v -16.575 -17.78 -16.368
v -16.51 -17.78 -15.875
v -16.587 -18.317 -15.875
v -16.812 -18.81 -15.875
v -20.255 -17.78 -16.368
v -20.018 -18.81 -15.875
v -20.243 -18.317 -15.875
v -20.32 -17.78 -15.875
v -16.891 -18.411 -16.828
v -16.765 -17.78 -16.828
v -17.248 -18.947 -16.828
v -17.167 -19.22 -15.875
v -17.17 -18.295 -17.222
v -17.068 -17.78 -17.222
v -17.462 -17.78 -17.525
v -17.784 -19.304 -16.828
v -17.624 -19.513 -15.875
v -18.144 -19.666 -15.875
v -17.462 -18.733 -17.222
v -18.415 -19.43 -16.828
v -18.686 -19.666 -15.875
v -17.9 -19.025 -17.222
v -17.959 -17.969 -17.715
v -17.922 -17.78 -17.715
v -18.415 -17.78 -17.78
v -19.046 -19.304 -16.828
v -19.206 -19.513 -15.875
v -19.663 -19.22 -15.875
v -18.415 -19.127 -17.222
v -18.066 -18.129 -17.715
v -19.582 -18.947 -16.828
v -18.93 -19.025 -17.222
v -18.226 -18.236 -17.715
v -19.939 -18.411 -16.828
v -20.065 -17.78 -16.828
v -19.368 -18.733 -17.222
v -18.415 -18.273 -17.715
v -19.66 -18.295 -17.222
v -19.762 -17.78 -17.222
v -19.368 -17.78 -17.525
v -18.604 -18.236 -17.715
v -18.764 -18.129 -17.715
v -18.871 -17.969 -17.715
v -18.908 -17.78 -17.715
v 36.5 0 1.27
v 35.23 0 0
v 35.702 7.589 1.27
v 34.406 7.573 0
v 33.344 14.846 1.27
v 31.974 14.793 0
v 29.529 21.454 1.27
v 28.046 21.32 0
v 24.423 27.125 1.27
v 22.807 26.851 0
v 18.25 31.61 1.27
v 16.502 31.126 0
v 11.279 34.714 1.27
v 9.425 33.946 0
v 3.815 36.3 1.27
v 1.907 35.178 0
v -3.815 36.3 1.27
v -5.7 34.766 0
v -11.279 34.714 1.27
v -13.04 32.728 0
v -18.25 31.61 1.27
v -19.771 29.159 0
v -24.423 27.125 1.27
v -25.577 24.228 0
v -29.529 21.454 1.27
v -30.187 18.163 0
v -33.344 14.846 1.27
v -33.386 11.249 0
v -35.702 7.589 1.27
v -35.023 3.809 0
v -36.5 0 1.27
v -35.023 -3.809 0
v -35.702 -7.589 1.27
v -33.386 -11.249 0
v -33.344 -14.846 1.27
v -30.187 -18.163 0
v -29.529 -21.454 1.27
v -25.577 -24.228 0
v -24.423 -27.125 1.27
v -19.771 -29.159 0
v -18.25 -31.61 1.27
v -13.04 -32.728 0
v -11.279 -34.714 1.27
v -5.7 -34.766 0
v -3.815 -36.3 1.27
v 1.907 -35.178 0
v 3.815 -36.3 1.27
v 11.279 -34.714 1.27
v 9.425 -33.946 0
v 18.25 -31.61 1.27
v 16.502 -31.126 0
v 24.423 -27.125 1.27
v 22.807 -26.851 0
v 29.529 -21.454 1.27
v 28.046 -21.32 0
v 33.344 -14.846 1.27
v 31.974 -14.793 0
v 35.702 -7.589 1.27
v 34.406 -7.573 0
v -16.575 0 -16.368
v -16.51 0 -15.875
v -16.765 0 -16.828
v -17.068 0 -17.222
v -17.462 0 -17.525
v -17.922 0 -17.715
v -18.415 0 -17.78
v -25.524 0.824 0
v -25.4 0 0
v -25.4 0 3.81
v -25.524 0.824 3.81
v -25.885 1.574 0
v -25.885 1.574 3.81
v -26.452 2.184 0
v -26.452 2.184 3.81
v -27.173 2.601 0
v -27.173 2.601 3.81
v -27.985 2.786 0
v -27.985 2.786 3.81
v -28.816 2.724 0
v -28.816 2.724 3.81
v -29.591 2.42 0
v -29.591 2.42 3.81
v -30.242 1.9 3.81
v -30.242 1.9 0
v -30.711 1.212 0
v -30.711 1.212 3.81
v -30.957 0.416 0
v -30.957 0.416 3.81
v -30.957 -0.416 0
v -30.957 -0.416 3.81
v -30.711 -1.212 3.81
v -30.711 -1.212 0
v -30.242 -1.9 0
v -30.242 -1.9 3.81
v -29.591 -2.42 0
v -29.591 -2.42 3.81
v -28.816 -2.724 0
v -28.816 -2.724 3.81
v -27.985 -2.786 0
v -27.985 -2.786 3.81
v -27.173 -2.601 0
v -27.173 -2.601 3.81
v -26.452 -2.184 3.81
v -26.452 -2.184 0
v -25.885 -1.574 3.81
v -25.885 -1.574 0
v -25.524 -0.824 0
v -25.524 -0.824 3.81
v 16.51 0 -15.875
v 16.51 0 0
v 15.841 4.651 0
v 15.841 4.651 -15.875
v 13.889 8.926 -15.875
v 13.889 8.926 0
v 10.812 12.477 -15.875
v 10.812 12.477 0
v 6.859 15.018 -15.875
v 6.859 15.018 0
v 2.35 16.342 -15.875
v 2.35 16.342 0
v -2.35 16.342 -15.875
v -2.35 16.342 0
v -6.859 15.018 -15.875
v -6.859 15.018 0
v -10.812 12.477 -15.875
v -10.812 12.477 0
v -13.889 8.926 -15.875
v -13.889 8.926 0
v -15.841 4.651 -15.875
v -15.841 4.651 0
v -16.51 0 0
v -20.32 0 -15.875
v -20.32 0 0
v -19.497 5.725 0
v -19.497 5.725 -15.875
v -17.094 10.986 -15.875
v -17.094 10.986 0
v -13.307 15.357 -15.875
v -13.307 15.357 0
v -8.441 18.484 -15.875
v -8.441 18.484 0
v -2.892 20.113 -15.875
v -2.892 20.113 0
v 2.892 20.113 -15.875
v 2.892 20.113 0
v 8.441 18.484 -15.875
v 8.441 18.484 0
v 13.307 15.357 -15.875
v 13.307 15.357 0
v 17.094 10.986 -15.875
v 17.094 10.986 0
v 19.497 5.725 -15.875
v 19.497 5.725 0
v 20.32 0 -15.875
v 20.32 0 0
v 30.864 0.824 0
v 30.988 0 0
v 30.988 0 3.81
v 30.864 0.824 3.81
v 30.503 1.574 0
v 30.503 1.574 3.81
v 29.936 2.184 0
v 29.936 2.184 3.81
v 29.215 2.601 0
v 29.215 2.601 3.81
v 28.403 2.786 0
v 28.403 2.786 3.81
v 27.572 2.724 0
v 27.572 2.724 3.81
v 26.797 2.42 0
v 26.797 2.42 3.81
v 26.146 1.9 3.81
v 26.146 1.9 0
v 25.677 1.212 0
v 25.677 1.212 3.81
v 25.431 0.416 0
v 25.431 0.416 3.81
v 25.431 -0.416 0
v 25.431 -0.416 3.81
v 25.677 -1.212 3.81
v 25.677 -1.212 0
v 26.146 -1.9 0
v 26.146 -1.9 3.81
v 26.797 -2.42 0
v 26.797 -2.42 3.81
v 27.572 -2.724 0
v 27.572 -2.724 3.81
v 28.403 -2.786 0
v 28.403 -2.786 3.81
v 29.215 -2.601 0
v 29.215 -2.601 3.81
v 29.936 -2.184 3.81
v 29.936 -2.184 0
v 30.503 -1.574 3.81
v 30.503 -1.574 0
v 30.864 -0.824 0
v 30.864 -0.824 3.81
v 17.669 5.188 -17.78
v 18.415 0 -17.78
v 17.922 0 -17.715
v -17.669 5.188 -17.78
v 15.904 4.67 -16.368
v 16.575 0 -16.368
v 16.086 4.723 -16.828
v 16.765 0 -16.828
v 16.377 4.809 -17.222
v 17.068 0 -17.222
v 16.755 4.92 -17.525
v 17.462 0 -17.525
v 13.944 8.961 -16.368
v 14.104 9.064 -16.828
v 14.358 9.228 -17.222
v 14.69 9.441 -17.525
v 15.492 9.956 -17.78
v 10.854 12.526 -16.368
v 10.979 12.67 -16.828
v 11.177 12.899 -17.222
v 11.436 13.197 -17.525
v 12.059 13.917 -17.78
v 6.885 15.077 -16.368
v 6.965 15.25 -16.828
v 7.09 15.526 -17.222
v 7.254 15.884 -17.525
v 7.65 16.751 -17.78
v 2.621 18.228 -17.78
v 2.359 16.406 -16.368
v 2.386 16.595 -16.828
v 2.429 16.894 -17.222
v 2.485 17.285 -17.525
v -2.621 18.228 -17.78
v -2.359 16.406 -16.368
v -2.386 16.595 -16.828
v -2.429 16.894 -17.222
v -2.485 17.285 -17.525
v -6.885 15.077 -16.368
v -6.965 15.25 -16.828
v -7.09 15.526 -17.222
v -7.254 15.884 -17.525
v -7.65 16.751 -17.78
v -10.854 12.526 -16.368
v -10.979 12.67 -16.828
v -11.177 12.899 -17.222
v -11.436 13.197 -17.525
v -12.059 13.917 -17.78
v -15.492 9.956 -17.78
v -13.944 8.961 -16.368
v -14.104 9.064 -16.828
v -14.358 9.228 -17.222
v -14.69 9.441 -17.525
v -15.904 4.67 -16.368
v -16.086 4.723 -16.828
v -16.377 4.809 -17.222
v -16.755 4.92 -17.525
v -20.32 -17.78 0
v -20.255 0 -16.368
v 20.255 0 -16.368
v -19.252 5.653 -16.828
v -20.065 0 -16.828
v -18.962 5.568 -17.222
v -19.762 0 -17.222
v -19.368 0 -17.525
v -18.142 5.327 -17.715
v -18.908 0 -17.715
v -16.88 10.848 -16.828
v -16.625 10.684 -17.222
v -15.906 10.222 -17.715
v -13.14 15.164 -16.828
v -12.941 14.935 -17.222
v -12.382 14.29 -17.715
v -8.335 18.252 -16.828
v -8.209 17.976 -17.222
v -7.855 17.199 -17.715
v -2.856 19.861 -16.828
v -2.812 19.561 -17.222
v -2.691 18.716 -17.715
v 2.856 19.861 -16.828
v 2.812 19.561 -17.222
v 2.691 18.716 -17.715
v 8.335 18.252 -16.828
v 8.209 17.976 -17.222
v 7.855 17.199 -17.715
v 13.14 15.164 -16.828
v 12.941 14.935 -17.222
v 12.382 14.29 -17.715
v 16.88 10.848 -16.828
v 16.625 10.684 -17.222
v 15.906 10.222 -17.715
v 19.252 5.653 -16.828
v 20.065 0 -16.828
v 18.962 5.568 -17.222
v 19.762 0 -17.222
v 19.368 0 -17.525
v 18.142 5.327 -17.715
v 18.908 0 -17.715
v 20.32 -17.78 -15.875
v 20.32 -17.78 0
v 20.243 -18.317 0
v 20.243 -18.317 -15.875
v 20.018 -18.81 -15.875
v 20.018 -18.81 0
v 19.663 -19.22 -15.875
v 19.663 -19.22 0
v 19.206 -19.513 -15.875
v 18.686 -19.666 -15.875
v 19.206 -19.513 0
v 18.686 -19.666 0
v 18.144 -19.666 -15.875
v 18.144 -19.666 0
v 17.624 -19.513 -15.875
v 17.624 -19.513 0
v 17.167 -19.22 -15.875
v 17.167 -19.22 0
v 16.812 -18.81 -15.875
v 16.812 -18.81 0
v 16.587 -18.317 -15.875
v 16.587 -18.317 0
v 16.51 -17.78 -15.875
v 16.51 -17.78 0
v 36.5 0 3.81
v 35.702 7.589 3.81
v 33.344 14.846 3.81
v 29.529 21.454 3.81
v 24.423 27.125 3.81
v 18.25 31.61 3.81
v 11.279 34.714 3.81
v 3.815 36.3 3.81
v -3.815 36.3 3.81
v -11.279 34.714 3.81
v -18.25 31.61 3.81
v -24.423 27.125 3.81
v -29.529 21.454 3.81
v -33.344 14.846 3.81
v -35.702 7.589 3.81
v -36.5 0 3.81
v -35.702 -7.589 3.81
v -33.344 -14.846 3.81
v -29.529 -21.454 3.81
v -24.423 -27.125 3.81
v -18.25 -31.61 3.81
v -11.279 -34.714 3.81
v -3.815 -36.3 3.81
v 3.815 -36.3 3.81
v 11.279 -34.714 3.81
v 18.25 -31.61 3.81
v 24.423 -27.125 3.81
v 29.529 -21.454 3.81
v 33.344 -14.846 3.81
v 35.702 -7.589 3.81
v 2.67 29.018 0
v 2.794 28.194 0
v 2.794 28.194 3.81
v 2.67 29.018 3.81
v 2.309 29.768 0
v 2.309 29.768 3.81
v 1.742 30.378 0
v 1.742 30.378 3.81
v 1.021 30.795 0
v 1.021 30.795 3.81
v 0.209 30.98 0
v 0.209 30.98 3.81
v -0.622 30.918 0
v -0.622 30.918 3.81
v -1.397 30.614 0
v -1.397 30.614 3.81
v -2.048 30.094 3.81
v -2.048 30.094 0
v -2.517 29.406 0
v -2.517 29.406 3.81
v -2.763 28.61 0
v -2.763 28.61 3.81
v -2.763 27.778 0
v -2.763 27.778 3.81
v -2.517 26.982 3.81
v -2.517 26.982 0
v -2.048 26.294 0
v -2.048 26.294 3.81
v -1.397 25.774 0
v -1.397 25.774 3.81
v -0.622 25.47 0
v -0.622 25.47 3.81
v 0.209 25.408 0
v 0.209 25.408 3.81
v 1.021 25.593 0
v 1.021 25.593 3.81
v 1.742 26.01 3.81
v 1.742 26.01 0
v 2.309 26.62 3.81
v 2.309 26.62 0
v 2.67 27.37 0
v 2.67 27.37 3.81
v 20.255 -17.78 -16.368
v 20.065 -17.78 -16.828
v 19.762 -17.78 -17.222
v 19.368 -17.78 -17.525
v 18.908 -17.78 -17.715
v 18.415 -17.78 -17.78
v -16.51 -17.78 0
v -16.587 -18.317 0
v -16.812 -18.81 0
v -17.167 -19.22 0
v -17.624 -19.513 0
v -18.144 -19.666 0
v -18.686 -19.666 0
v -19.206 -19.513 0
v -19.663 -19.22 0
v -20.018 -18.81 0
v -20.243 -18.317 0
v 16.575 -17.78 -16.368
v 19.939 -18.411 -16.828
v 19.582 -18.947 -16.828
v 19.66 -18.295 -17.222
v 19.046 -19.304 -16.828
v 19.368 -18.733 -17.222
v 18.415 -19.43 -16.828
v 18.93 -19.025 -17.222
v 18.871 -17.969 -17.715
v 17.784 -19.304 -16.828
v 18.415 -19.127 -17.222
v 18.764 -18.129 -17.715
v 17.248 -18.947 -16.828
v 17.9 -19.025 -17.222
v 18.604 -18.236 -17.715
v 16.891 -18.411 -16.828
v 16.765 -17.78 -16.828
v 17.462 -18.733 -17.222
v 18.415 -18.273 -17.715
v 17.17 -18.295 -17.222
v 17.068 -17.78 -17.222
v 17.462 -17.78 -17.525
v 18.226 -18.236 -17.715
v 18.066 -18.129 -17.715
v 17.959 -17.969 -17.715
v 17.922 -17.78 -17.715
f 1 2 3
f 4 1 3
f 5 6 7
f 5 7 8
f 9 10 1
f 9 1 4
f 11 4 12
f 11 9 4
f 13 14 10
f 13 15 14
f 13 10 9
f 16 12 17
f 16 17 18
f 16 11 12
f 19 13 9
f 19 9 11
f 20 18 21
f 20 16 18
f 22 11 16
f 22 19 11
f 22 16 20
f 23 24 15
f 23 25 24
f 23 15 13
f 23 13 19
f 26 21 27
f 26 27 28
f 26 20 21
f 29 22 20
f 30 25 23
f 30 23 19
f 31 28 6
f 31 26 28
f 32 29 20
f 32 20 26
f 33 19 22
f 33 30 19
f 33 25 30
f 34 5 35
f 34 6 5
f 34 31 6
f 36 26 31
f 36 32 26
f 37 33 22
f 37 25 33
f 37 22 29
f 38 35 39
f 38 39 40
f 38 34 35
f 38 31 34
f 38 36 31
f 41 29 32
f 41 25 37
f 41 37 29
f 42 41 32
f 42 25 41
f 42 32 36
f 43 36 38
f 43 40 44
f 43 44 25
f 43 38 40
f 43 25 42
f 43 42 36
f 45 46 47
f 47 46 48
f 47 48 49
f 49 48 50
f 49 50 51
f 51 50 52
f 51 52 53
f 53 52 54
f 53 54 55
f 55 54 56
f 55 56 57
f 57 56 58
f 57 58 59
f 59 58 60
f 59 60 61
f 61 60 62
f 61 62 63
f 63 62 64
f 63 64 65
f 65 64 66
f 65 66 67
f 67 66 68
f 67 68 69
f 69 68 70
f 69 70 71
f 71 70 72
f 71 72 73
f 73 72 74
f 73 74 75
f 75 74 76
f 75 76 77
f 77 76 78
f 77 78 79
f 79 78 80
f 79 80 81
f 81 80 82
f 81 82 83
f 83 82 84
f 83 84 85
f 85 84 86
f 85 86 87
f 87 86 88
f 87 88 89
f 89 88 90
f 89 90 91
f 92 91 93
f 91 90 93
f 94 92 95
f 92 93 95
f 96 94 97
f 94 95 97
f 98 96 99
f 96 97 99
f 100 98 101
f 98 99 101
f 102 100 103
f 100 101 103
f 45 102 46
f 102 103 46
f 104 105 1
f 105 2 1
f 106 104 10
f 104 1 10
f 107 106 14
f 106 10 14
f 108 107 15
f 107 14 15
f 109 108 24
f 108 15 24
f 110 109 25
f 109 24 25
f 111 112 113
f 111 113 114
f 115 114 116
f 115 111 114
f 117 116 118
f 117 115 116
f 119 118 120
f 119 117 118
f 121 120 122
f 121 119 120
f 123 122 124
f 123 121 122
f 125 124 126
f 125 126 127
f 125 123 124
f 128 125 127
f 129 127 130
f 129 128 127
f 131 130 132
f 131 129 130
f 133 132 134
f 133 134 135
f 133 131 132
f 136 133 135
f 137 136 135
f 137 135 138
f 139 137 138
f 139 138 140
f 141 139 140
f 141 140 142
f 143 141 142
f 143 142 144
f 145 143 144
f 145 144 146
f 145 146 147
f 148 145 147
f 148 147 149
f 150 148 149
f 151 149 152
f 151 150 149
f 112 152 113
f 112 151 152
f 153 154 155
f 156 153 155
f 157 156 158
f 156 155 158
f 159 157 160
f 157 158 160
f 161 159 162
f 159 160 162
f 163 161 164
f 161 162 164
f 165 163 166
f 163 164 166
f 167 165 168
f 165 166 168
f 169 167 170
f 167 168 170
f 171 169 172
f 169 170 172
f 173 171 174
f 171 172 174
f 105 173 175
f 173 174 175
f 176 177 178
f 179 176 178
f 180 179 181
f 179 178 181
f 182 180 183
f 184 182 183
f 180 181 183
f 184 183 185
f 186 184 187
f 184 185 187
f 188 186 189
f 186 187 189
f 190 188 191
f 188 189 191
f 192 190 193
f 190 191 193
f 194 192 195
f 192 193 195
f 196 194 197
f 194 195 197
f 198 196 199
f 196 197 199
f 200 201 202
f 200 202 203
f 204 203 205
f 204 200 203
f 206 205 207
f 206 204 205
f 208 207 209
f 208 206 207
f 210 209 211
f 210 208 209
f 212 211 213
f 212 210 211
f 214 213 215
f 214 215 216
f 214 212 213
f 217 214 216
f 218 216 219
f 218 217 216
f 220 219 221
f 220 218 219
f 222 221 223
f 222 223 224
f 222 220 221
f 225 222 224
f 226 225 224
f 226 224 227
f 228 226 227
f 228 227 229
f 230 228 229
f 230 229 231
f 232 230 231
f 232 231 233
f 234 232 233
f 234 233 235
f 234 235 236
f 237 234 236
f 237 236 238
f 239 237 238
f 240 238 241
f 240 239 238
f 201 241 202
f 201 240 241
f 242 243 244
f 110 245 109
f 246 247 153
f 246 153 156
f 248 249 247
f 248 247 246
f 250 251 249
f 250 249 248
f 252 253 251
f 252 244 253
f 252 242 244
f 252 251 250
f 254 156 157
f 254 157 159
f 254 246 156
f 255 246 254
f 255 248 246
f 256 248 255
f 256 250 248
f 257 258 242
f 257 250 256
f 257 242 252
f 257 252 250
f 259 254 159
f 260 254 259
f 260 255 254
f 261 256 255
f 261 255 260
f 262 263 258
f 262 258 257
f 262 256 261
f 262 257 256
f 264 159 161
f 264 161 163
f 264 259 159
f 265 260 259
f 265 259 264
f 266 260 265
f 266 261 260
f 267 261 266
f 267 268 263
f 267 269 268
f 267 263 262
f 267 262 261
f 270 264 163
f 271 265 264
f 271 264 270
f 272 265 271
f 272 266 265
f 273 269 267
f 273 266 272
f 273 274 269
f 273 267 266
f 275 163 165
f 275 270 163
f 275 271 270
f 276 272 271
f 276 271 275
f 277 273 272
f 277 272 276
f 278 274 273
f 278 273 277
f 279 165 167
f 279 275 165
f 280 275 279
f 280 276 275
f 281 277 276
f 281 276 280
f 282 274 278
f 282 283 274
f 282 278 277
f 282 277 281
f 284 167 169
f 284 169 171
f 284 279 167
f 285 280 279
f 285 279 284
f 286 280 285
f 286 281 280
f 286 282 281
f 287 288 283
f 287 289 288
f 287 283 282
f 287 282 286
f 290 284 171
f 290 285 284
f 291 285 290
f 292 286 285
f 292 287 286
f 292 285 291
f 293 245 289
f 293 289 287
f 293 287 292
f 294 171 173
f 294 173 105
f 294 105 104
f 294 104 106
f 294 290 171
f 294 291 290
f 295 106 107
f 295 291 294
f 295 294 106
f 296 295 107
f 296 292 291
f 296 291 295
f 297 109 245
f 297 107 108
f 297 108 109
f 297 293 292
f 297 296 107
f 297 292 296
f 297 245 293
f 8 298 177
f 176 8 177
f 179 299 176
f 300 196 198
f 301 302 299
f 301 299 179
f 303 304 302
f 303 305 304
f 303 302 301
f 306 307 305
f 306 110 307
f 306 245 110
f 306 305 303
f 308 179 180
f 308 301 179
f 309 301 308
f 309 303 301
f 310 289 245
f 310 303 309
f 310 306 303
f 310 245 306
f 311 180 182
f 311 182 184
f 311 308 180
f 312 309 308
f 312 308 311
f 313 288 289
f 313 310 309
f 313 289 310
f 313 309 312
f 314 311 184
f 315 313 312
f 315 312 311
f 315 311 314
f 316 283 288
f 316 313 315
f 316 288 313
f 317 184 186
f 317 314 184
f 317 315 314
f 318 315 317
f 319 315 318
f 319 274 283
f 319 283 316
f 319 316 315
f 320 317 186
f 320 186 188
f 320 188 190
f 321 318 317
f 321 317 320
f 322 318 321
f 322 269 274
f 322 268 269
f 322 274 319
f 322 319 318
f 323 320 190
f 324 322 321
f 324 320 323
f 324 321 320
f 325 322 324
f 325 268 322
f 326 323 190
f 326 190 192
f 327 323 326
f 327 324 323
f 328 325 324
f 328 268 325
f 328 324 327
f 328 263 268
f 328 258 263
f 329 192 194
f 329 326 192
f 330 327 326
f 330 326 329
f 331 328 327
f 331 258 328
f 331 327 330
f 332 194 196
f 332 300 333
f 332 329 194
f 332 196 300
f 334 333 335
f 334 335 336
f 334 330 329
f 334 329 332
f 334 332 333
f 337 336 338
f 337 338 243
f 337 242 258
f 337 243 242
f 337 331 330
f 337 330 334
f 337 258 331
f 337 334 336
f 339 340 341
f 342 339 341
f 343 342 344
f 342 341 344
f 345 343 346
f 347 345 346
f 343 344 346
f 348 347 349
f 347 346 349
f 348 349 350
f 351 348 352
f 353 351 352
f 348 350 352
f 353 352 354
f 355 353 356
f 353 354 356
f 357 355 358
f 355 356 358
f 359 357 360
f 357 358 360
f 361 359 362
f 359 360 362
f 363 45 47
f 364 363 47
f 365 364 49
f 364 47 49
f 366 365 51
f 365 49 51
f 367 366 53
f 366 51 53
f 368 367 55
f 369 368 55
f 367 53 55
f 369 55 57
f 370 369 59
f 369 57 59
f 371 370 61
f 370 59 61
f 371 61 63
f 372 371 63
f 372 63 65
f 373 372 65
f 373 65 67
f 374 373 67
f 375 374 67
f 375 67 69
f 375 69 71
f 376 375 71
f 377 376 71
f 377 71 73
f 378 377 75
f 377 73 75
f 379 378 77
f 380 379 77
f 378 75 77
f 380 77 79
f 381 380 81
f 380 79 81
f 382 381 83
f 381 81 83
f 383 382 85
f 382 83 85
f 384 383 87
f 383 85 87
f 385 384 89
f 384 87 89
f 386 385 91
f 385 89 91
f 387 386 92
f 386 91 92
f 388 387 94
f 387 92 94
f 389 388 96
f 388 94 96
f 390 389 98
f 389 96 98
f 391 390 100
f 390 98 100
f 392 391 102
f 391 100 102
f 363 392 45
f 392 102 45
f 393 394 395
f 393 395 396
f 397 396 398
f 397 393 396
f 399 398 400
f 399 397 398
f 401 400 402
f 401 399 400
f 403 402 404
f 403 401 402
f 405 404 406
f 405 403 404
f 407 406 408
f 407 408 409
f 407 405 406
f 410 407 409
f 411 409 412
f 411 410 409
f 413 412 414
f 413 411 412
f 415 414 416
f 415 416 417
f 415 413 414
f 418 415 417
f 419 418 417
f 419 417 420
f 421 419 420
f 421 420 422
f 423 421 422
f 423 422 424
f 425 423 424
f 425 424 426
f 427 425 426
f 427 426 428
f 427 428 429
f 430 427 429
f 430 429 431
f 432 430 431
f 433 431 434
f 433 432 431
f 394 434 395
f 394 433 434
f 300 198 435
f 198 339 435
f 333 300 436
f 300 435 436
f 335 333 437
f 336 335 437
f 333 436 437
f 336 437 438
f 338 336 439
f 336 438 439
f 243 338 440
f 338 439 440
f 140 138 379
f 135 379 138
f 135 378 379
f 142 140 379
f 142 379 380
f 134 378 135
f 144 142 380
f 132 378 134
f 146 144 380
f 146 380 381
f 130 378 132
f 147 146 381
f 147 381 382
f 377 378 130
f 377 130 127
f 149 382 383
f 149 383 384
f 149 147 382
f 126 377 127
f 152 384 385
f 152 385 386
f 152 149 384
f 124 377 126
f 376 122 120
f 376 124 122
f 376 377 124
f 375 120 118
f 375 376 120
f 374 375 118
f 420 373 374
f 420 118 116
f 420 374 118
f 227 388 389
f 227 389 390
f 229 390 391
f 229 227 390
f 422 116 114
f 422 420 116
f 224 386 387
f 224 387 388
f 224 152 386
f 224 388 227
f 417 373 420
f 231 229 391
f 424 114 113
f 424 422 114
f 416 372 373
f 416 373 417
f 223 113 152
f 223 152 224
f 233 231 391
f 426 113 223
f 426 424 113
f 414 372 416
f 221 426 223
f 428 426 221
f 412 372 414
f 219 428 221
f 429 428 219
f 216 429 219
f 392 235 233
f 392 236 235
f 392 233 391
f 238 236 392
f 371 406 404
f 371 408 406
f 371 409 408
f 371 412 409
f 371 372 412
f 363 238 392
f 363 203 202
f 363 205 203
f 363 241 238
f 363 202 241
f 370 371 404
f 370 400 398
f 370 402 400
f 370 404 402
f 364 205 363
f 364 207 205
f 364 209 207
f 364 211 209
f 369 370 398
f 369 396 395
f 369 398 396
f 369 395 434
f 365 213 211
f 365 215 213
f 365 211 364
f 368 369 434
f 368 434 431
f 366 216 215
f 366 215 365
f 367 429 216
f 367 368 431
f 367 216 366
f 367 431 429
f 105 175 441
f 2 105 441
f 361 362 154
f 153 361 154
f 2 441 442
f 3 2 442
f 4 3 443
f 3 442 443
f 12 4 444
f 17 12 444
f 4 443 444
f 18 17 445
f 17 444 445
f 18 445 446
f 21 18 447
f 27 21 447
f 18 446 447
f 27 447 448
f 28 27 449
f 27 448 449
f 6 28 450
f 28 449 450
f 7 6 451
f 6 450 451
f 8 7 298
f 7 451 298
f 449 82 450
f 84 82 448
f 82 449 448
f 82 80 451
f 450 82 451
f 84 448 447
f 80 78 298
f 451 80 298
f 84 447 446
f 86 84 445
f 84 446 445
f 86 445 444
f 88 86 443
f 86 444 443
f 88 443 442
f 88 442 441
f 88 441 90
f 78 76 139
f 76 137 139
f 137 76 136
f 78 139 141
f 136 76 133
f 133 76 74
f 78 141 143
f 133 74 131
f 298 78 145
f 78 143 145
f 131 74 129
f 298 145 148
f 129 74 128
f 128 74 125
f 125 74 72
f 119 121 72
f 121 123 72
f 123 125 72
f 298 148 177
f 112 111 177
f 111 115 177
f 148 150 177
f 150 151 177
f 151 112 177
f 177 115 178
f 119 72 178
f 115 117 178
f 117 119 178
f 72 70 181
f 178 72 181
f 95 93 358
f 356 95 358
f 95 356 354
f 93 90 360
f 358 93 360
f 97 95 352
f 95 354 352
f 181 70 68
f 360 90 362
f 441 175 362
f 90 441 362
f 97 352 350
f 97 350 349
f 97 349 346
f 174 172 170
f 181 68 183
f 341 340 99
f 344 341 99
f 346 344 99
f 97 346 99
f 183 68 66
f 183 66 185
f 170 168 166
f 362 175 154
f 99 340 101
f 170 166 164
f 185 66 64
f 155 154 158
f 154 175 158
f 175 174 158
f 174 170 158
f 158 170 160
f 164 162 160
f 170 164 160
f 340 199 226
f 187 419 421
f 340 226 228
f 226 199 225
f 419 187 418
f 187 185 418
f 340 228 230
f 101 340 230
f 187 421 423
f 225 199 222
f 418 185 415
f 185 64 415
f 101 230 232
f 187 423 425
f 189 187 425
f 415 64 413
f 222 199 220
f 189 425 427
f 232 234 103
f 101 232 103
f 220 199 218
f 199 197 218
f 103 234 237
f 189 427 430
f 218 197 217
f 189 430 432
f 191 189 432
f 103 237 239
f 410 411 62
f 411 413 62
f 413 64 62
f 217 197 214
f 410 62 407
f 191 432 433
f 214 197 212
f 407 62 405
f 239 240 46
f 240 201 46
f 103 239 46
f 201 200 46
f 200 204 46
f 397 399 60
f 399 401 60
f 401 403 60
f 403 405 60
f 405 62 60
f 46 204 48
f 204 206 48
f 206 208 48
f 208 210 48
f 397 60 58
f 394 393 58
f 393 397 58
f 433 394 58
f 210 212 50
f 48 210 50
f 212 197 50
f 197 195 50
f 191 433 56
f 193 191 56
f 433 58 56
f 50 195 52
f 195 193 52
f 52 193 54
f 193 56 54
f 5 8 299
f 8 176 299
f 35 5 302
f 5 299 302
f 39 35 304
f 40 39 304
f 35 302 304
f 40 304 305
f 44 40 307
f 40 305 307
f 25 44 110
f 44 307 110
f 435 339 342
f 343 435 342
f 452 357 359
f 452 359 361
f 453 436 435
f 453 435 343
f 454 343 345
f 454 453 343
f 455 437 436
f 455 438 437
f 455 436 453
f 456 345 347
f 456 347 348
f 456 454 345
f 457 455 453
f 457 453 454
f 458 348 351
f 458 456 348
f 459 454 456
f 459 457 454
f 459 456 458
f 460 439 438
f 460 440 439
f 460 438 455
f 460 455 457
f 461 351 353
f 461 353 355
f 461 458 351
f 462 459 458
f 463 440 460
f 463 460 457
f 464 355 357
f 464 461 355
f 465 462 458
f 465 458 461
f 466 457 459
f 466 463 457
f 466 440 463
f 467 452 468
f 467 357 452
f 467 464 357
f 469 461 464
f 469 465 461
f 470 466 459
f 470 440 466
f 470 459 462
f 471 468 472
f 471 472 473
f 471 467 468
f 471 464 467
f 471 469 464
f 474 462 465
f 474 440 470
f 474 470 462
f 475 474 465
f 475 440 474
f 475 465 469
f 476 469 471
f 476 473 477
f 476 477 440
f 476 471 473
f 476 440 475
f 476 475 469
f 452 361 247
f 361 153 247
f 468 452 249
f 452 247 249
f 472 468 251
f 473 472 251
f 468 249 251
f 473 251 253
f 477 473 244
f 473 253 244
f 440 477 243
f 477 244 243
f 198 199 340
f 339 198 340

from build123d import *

# Parameters (mm, degrees)
F0_R     = 36.5
F0_R_2   = 2.794
F1_DEPTH = 3.81
F2_SIZE  = 1.27
F4_DEPTH = 17.78
F5_R     = 1.90499


# Not quite as in the source:
# - a fillet or chamfer is up to 0.001 mm smaller than in the source, because OpenCascade refuses the exact size


with BuildPart() as f1:
    # F0 (on Top) → F1 (new body)
    with BuildSketch(Plane.XY):
        Circle(F0_R)
        with Locations((-28.194, 0)):
            Circle(F0_R_2, mode=Mode.SUBTRACT)
        with Locations((28.194, 0)):
            Circle(F0_R_2, mode=Mode.SUBTRACT)
        with Locations((0, 28.194)):
            Circle(F0_R_2, mode=Mode.SUBTRACT)
    extrude(amount=F1_DEPTH)

    # F2
    f2_edges = [f1.edges().sort_by_distance(p)[0] for p in [
        (-36.5, 0, 0),
    ]]
    chamfer(f2_edges, length=F2_SIZE)

    # F3 (on face) → F4 (join)
    with BuildSketch(Plane(origin=(0, 0, 0), x_dir=(1, 0, 0), z_dir=(0, 0, -1))):
        with BuildLine():
            Line((16.51, 17.78), (16.51, 0))
            ThreePointArc((16.51, 0), (0, -16.51), (-16.51, 0))
            Line((-16.51, 0), (-16.51, 17.78))
            ThreePointArc((-16.51, 17.78), (-18.415, 19.685), (-20.32, 17.78))
            Line((-20.32, 17.78), (-20.32, 0))
            ThreePointArc((-20.32, 0), (0, -20.32), (20.32, 0))
            Line((20.32, 0), (20.32, 17.78))
            ThreePointArc((20.32, 17.78), (18.415, 19.685), (16.51, 17.78))
        make_face()
    extrude(amount=F4_DEPTH)

    # F5 (radius 1.905 in the source; OpenCascade refuses exactly that, so slightly less here)
    f5_edges = [f1.edges().sort_by_distance(p)[0] for p in [
        (-20.32, -8.89, -17.78),
        (-16.51, -8.89, -17.78),
        (-18.415, -19.685, -17.78),
        (0, 20.32, -17.78),
        (0, 16.51, -17.78),
        (16.51, -8.89, -17.78),
        (20.32, -8.89, -17.78),
        (18.415, -19.685, -17.78),
    ]]
    fillet(f5_edges, radius=F5_R)


solid = f1.part
